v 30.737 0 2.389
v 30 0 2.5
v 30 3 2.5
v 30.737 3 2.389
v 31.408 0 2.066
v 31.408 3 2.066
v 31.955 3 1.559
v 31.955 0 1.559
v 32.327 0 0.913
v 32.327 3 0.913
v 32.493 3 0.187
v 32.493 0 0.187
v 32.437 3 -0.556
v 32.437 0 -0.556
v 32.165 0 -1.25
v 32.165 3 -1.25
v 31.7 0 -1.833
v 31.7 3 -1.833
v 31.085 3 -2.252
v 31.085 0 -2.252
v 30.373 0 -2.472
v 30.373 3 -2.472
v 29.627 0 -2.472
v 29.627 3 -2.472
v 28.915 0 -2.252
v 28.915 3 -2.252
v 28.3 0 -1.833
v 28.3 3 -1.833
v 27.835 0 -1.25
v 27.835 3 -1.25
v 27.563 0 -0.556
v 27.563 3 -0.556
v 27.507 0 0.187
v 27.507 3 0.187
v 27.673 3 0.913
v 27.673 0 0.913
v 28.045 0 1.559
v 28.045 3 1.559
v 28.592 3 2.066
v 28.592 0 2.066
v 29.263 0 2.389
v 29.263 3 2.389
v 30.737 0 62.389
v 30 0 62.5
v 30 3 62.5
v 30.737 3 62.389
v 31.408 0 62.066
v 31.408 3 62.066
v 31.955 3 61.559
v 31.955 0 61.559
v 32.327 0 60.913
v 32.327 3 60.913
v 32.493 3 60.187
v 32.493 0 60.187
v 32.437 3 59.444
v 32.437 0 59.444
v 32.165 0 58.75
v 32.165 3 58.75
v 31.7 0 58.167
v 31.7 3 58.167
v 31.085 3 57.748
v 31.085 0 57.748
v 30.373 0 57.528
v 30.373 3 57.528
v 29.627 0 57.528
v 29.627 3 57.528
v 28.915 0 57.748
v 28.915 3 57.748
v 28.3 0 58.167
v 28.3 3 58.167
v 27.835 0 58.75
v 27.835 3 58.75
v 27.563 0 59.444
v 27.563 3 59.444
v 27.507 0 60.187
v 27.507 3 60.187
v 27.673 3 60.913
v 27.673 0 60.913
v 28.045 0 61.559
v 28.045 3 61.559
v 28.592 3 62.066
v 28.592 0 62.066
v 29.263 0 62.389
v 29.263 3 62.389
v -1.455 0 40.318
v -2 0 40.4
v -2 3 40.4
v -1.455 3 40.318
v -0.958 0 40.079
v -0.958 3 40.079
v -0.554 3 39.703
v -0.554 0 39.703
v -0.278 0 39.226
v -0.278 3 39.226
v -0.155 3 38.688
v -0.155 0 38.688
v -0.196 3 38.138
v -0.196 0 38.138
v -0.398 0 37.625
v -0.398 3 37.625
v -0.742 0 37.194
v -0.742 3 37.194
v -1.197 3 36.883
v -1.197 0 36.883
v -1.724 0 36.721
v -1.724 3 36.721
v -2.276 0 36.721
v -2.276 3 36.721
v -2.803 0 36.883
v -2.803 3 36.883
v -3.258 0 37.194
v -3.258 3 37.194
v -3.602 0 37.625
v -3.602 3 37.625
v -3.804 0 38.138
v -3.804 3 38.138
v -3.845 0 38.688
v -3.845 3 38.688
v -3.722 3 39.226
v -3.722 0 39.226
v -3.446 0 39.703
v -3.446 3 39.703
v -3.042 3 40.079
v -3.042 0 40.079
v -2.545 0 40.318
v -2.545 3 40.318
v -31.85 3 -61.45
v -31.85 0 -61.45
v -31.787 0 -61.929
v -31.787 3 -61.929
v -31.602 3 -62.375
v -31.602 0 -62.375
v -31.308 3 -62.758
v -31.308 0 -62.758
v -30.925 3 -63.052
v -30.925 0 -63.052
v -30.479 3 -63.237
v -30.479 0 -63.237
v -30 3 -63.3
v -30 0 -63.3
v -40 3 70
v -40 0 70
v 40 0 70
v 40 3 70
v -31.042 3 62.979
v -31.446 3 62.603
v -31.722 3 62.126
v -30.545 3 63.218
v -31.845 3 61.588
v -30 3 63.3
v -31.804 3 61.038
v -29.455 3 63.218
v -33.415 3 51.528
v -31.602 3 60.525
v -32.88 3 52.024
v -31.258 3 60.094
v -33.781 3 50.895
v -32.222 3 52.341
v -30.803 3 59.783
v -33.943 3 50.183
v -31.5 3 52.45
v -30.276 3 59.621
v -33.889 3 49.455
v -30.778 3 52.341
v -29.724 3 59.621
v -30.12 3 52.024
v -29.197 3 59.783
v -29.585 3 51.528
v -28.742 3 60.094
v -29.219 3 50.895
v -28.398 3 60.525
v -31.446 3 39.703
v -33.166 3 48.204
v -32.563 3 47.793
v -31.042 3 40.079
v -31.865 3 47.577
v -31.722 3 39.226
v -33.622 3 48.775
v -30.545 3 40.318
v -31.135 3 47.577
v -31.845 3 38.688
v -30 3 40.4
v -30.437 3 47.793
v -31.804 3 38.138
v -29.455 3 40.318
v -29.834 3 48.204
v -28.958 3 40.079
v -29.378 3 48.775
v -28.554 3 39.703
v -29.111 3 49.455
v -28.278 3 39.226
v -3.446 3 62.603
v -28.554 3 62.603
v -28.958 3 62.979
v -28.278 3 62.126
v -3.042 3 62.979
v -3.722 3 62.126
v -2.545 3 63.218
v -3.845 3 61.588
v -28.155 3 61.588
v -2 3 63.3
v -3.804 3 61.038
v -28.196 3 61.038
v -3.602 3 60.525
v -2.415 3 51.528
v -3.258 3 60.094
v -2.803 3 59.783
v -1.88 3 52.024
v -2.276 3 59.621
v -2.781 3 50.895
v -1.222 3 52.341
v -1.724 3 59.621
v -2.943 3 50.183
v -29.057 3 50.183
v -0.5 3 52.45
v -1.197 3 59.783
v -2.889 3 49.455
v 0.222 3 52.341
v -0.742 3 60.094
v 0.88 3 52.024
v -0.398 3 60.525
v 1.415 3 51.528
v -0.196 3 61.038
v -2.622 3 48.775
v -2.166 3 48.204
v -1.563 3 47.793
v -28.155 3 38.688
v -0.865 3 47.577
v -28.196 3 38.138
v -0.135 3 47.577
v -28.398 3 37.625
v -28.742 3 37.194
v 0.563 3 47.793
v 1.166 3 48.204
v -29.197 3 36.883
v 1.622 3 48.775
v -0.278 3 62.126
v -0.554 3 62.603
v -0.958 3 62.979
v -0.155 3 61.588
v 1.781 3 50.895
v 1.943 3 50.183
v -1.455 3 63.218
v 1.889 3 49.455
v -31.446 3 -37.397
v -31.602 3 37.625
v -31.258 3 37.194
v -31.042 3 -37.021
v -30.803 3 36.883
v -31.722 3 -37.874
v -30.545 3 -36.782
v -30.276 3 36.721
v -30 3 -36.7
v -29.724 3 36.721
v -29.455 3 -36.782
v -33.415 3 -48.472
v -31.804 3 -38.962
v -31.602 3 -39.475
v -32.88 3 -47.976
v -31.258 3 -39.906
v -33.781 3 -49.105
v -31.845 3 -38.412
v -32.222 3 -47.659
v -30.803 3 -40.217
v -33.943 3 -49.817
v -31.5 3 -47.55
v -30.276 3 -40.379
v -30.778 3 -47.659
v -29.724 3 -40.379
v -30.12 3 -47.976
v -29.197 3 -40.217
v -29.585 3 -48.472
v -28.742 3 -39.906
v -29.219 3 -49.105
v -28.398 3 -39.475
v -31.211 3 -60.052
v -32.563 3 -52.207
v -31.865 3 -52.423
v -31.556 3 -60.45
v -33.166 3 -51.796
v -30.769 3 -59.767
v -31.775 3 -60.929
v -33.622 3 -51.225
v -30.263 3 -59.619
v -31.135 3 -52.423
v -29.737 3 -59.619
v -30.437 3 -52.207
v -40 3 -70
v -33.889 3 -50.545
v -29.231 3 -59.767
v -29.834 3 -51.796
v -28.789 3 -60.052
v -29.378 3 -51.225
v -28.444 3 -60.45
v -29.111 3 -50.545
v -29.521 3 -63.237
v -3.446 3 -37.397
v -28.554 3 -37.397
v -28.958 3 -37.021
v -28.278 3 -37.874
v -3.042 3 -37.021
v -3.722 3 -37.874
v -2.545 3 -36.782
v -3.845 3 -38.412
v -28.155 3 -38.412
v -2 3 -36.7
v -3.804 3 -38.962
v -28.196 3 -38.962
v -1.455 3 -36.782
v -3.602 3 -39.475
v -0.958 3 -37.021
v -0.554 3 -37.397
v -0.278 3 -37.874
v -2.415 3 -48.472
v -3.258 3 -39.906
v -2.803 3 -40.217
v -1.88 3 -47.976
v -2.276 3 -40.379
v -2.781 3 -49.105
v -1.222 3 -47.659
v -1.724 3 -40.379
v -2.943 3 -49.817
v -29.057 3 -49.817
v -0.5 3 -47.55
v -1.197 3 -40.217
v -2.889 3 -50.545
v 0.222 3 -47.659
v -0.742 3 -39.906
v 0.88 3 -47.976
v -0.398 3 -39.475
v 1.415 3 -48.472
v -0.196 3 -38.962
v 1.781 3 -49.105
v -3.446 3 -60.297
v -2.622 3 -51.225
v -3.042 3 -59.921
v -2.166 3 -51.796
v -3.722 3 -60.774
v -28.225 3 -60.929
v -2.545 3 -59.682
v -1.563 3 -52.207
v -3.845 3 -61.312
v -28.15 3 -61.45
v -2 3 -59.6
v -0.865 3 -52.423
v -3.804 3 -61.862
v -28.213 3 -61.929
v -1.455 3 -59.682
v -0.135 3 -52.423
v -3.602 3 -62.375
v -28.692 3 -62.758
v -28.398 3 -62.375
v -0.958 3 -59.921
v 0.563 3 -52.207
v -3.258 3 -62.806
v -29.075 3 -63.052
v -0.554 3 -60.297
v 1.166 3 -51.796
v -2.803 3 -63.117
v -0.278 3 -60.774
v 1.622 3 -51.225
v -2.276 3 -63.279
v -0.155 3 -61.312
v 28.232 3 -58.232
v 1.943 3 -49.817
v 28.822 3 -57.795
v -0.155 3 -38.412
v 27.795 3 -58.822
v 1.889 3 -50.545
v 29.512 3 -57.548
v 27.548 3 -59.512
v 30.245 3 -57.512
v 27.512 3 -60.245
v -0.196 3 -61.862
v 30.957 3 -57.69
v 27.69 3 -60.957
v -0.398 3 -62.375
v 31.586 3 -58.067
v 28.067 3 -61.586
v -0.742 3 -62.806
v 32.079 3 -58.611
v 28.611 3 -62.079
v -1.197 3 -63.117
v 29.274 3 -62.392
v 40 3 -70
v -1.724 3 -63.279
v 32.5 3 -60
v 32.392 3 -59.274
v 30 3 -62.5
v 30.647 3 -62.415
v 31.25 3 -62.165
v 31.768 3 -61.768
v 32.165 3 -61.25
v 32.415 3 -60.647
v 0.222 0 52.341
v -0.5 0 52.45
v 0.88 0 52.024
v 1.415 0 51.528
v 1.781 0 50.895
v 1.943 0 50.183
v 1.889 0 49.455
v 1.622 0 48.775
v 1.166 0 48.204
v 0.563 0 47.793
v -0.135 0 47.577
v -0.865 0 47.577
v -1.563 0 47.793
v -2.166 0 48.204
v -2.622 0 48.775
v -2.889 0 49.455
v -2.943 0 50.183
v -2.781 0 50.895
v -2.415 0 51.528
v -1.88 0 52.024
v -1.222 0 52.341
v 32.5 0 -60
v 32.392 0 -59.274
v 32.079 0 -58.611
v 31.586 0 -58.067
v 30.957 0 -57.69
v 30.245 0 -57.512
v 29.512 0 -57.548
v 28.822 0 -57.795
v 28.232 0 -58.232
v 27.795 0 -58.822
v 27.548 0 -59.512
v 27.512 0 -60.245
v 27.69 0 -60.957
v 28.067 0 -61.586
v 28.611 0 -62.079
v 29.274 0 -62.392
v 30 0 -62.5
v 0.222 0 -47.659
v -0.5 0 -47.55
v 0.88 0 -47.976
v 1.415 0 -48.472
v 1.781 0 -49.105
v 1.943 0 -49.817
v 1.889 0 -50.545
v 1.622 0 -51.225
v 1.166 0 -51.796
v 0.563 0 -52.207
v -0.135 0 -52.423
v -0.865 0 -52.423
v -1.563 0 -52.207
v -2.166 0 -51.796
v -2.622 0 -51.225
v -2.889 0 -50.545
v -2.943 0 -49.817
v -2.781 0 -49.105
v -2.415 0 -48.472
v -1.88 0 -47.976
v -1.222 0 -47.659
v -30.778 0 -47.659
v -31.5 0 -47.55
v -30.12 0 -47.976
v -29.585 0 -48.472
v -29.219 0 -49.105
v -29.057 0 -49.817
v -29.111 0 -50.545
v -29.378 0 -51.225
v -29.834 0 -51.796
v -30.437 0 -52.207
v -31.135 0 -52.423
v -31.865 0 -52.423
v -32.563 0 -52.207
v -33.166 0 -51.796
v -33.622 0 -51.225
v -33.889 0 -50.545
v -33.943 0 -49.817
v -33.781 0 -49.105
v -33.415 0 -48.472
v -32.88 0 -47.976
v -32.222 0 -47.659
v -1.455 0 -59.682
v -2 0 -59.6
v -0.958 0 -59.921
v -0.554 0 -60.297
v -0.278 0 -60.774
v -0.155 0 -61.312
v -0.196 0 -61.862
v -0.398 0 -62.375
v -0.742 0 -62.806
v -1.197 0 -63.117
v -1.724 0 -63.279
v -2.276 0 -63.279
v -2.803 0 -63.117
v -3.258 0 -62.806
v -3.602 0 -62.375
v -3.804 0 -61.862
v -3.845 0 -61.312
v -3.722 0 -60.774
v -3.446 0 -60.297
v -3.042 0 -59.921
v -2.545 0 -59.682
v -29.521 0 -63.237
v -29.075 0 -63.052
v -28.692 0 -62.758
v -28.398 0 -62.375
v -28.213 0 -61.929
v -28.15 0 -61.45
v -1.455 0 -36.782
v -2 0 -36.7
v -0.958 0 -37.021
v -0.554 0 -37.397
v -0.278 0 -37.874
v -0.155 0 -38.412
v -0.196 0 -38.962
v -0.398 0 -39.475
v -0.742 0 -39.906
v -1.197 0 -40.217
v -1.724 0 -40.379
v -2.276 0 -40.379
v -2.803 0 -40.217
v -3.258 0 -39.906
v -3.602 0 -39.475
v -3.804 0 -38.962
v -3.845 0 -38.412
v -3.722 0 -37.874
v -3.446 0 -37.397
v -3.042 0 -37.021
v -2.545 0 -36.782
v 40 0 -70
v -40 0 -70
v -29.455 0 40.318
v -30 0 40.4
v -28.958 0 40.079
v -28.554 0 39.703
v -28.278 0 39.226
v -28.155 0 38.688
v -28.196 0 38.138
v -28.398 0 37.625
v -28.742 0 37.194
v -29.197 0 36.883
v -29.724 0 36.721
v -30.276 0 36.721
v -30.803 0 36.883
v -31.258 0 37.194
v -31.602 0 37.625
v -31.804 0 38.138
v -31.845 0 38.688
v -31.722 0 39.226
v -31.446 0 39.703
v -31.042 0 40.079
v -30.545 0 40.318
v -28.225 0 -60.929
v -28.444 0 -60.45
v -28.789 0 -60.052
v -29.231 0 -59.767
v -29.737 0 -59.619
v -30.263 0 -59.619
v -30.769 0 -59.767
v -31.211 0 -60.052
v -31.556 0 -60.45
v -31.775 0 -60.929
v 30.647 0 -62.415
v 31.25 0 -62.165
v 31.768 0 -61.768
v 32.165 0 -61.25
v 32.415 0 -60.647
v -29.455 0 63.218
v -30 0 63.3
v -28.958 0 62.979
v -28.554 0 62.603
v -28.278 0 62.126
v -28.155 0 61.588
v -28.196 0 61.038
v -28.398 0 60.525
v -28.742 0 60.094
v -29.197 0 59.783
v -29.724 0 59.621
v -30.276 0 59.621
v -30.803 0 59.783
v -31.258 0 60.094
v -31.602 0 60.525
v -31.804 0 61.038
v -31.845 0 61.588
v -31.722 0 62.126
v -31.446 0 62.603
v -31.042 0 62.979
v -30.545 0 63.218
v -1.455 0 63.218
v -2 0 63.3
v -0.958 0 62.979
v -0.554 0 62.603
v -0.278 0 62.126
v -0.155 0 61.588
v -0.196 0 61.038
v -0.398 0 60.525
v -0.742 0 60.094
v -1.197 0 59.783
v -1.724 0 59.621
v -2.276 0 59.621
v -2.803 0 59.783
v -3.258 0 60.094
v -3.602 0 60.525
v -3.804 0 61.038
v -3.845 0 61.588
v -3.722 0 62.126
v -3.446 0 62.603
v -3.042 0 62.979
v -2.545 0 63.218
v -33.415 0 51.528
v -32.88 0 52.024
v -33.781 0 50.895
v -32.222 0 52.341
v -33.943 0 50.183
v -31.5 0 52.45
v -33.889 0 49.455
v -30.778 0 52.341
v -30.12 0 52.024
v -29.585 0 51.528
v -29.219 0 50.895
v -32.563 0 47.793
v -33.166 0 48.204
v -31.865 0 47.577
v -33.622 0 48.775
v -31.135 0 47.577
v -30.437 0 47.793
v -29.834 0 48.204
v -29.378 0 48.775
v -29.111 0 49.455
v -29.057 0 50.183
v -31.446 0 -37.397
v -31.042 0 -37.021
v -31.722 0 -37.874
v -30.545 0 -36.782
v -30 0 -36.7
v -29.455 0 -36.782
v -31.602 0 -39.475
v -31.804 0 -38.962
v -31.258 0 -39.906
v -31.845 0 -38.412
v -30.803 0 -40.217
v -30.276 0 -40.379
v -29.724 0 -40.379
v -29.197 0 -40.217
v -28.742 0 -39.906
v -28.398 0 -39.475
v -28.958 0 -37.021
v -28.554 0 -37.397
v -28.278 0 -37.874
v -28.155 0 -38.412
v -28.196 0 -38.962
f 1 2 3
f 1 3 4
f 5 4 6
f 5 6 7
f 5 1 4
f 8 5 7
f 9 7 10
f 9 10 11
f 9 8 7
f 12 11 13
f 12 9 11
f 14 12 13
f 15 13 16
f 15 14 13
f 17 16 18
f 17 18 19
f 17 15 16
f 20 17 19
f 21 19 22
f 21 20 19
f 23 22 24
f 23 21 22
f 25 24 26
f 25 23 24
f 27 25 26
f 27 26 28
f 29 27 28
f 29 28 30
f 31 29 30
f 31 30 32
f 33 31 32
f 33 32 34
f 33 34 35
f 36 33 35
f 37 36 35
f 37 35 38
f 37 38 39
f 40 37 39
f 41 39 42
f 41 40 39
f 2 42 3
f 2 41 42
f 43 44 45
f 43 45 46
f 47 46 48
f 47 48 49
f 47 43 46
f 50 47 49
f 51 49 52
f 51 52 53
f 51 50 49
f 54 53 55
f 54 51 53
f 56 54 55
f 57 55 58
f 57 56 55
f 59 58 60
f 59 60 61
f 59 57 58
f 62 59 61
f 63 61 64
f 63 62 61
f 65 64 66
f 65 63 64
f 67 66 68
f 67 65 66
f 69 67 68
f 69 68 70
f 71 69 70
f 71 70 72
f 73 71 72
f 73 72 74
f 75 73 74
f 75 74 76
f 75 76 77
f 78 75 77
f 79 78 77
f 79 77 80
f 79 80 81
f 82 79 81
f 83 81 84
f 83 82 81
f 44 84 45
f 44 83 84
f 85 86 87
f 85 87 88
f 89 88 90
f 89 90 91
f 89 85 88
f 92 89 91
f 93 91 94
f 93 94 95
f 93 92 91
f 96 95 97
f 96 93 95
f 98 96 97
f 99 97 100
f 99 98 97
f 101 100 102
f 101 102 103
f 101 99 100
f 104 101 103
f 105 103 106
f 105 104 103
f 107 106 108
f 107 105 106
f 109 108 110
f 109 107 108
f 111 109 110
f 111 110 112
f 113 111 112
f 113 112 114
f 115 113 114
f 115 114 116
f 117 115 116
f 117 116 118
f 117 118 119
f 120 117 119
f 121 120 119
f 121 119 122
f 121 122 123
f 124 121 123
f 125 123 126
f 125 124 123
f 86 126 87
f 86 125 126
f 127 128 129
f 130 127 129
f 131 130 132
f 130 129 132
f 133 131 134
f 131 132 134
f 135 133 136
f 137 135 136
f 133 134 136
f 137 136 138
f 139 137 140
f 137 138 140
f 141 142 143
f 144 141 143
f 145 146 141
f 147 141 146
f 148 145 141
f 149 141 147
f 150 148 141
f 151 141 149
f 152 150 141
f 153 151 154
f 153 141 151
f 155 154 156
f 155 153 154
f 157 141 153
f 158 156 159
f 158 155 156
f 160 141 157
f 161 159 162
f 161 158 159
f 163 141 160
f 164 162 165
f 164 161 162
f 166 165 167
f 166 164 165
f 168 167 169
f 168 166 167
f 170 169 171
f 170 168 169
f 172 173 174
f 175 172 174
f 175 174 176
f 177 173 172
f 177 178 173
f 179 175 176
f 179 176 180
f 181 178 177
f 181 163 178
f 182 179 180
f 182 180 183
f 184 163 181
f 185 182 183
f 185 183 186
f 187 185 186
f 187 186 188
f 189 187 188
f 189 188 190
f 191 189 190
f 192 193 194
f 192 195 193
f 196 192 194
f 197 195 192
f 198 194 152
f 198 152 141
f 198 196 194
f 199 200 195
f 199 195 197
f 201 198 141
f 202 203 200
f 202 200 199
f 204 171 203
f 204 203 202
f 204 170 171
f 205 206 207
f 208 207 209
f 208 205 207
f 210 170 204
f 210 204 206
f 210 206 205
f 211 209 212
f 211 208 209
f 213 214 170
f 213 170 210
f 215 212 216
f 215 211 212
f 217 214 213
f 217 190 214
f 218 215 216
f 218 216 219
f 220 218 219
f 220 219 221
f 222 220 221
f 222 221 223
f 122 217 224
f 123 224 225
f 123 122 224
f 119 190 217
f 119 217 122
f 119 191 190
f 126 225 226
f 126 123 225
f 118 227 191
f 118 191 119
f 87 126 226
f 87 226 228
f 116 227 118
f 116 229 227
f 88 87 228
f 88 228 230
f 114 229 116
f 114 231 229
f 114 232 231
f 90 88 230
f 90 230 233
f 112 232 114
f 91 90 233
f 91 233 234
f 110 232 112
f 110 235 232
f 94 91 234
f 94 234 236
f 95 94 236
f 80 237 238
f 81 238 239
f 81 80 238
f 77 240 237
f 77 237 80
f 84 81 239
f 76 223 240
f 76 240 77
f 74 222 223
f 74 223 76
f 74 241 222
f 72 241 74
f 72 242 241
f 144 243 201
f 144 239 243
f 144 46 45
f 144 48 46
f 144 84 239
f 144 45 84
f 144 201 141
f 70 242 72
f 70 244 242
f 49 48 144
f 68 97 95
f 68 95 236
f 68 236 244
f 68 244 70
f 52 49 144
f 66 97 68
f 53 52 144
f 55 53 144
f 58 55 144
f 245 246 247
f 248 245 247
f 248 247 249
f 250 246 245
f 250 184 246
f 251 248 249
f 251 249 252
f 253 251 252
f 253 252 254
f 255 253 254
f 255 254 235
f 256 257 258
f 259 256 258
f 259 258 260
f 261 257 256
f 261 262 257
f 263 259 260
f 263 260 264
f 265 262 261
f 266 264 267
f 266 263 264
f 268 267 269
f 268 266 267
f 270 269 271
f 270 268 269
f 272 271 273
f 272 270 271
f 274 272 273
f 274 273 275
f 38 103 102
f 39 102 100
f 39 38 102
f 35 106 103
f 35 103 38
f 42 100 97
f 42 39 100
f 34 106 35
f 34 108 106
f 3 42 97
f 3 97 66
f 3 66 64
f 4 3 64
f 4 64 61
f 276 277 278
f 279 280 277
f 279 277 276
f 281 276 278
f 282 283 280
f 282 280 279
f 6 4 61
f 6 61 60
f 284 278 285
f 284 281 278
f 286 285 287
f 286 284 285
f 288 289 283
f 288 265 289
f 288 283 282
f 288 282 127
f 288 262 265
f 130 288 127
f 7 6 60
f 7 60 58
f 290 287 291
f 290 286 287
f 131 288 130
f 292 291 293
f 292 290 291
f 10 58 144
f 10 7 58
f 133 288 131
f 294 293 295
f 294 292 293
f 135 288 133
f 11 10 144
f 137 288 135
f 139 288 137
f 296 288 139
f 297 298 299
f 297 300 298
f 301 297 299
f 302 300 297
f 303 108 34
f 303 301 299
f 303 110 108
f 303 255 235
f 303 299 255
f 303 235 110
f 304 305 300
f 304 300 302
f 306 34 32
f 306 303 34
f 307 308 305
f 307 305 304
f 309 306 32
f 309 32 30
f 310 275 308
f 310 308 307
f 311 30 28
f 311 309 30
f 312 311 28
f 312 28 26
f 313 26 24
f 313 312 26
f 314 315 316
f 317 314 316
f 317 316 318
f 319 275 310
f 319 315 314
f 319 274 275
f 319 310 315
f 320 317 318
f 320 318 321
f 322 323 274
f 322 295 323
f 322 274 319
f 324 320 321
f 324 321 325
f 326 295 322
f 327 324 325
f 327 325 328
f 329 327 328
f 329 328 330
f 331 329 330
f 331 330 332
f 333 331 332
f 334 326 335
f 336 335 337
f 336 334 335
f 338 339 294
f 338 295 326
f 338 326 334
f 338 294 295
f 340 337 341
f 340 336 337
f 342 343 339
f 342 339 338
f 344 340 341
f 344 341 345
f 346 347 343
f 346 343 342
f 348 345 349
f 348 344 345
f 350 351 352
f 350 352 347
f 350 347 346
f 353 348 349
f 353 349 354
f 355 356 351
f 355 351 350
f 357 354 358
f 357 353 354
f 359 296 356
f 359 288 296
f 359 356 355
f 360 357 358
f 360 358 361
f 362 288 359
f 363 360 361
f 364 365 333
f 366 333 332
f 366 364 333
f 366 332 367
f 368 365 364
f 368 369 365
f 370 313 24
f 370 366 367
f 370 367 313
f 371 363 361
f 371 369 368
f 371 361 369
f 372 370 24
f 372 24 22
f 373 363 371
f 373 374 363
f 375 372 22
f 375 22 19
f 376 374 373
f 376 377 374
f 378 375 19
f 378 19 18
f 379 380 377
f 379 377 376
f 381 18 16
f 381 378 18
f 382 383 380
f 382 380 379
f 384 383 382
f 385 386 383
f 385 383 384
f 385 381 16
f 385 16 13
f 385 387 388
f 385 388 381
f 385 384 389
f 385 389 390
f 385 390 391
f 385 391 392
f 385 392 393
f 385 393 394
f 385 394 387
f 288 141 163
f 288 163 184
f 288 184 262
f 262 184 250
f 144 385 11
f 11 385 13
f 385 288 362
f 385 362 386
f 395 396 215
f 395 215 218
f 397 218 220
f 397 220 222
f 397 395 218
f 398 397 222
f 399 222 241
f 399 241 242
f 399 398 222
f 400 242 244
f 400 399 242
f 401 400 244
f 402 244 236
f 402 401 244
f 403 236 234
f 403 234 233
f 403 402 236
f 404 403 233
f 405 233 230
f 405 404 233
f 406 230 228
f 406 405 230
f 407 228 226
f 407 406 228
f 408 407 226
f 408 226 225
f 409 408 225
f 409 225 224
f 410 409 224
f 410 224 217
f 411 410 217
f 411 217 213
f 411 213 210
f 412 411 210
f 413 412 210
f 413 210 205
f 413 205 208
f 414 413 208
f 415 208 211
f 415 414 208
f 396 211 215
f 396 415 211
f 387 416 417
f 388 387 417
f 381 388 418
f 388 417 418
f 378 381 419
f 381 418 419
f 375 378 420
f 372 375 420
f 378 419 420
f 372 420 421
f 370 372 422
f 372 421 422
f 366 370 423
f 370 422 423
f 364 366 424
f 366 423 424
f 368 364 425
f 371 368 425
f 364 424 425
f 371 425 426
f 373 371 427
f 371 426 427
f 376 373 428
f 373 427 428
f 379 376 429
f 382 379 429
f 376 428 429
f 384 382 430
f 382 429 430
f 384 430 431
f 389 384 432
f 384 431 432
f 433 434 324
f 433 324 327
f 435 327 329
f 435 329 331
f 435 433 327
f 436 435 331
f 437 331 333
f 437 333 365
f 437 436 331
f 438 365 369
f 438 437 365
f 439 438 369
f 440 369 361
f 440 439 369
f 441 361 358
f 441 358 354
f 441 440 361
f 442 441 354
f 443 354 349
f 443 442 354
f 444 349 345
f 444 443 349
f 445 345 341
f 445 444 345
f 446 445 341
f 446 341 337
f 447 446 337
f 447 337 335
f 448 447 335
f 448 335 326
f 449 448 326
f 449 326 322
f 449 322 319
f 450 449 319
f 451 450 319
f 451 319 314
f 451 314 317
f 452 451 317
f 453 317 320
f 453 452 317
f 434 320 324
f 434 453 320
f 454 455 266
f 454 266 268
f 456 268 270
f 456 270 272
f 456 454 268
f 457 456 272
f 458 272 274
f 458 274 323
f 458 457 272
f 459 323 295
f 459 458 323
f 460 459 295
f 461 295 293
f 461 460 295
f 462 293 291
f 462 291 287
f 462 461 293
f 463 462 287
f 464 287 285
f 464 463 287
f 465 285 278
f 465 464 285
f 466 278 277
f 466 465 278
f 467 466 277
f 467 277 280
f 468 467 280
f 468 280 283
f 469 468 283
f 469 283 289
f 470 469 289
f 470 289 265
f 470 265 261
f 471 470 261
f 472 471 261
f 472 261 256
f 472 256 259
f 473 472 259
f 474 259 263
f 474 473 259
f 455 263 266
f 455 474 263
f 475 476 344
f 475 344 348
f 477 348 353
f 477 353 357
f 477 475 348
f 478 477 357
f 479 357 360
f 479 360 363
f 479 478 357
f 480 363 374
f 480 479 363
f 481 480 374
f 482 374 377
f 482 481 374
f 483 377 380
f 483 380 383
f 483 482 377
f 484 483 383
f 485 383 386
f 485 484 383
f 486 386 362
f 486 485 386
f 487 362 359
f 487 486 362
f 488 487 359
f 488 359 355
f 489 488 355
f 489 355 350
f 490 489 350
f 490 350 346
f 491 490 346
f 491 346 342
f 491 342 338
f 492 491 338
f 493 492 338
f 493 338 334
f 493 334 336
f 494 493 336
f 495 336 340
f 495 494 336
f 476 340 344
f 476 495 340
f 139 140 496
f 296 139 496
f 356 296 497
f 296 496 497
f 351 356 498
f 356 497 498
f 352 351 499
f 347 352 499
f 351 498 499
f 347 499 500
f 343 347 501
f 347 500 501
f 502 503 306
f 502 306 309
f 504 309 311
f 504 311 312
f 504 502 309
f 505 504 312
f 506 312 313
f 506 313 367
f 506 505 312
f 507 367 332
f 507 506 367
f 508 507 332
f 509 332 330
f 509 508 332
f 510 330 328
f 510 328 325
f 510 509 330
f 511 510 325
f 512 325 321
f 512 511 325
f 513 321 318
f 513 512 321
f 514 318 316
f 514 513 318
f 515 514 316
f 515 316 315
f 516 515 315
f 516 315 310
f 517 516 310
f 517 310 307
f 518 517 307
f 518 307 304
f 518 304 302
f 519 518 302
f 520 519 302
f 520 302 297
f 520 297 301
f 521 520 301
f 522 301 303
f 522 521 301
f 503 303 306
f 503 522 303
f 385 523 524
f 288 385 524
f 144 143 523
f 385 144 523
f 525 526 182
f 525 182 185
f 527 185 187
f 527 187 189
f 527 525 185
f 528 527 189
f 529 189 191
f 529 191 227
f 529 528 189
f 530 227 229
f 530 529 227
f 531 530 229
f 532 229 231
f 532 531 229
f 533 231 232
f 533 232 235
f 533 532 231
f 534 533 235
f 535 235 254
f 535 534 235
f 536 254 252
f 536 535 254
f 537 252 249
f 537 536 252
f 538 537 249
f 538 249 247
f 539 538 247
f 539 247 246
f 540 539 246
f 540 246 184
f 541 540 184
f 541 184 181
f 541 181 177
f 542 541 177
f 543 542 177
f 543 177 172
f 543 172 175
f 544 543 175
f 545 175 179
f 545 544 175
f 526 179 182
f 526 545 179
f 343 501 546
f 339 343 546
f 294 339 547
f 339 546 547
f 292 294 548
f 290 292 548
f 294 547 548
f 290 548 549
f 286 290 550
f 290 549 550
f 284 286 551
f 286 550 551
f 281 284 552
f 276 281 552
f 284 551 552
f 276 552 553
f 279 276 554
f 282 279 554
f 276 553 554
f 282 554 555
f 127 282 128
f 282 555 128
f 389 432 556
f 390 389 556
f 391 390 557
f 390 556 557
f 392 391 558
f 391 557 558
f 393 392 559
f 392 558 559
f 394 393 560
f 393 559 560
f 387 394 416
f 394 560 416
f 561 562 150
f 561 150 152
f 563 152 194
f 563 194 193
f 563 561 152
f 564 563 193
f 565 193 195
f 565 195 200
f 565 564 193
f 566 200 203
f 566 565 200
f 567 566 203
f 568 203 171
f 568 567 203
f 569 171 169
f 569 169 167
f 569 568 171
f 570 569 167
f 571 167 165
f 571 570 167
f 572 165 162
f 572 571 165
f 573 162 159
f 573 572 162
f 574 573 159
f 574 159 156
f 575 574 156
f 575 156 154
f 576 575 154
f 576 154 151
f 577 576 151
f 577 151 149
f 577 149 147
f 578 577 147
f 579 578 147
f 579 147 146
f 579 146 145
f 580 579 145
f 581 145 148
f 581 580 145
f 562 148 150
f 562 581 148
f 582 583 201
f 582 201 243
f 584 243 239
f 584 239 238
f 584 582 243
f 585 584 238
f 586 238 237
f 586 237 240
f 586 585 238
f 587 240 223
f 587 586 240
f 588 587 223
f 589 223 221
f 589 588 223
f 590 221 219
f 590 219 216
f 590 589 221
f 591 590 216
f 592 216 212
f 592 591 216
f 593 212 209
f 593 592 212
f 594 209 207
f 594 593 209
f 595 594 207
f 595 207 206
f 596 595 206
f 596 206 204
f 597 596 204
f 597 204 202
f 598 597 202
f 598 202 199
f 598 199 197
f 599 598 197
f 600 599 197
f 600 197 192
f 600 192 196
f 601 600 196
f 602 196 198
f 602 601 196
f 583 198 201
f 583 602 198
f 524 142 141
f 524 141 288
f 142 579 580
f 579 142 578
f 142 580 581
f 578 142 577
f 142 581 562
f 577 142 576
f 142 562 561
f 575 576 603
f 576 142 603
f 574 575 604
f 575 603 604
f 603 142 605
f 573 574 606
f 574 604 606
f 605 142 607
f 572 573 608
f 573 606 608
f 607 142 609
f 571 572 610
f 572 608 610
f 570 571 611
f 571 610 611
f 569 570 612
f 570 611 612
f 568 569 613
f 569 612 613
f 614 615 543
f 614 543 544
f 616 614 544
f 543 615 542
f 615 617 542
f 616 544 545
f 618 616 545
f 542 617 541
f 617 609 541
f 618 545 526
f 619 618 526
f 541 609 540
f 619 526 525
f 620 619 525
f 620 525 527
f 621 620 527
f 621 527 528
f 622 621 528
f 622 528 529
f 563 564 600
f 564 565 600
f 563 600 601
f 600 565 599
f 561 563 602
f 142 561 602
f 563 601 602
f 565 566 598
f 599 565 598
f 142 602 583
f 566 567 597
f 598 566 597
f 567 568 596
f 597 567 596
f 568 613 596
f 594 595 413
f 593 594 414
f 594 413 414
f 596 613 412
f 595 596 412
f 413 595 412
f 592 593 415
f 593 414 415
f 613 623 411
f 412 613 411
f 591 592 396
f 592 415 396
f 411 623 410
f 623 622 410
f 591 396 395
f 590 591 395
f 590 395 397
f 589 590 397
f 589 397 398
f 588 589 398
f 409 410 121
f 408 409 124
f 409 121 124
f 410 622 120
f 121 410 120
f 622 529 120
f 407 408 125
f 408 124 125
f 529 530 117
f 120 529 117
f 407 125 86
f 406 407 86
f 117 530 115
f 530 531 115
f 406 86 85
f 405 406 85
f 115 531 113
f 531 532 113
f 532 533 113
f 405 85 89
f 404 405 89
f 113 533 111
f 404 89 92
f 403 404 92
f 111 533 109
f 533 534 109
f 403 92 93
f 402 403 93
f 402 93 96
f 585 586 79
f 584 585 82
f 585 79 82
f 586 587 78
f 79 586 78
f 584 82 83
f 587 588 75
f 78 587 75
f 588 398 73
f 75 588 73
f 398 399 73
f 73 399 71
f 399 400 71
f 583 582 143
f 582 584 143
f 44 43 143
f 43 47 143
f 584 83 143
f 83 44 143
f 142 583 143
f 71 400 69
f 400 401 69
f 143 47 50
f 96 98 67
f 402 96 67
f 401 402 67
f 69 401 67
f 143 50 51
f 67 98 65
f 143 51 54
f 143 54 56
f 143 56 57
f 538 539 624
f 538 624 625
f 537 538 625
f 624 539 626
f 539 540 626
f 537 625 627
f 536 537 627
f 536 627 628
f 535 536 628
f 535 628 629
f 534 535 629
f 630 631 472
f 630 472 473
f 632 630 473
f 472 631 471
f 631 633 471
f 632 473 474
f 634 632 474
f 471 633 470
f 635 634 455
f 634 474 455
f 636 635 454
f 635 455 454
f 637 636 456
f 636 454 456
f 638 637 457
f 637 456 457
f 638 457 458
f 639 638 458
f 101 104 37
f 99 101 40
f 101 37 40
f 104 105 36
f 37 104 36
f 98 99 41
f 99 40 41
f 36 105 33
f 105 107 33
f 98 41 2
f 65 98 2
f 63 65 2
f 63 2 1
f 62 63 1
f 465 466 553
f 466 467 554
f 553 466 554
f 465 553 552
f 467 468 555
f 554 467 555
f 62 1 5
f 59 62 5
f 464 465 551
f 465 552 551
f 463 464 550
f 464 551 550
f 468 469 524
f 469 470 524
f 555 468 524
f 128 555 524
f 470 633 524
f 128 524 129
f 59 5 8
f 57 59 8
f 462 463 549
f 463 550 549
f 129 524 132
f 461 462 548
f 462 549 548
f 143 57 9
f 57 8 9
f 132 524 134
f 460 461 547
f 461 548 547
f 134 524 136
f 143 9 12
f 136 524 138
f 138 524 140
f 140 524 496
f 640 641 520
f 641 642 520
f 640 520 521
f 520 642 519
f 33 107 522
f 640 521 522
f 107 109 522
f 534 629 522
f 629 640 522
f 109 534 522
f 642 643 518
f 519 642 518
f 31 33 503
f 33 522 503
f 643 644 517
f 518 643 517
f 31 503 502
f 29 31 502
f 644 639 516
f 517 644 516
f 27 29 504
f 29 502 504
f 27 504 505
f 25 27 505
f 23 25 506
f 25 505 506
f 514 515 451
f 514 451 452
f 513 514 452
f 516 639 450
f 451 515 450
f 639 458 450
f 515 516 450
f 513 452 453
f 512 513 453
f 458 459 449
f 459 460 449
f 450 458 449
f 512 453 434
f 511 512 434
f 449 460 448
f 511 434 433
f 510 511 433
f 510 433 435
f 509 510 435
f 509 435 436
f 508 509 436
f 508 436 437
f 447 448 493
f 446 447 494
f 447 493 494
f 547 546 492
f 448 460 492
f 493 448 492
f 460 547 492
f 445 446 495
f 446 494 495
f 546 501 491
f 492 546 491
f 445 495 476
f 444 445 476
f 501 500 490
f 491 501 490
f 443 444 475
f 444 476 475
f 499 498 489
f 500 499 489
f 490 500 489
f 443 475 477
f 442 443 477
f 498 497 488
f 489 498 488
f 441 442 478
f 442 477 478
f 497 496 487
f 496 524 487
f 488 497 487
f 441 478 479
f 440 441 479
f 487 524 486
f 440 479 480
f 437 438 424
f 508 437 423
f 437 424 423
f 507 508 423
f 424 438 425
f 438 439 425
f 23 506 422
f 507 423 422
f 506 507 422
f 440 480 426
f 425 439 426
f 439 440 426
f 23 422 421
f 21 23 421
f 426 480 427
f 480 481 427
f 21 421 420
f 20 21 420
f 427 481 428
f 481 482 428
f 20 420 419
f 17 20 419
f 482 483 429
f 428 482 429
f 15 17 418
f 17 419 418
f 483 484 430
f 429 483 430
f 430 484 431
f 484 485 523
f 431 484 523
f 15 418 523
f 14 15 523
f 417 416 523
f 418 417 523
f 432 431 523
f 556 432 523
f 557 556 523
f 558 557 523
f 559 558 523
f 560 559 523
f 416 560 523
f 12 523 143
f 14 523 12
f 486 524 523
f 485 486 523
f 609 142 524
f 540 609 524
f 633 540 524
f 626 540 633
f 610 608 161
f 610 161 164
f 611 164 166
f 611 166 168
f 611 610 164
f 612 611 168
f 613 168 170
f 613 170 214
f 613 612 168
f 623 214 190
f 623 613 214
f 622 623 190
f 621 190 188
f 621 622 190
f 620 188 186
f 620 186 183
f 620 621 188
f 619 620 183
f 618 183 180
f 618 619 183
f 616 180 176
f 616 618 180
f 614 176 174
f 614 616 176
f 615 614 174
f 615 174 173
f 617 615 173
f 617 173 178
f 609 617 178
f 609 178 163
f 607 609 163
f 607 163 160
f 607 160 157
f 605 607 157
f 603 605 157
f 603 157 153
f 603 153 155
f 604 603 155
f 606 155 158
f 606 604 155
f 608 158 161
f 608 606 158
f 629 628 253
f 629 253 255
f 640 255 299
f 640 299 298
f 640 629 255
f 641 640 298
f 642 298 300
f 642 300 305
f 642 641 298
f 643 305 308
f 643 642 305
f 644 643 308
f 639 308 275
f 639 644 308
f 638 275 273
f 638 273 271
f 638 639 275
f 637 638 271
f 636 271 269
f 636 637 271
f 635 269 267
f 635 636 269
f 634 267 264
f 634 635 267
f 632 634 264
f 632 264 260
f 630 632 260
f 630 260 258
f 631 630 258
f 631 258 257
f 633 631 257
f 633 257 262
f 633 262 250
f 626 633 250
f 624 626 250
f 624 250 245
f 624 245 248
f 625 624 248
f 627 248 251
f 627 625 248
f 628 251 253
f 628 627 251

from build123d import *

# Parameters (mm, degrees)
SKETCH_1_R      = 2.5
SKETCH_1_R_2    = 2.45
SKETCH_1_R_3    = 1.85
SKETCH_1_W      = 48
SKETCH_1_H      = 40
EXTRUDE_1_DEPTH = 3


with BuildPart() as part:
    # 草图1 → 凸台-拉伸1 (new body)
    # profile 1 of 5: a face of its own
    with BuildSketch(Plane(origin=(0, 0, 0), x_dir=(1, 0, 0), z_dir=(0, 1, 0))):
        with BuildLine():
            Line((8, -30), (8, -70))
            Line((8, -70), (40, -70))
            Line((40, -70), (40, 60))
            Line((40, 60), (32.5, 60))
            ThreePointArc((32.5, 60), (28.232233047, 58.232233047), (30, 62.5))
            Line((30, 62.5), (30, 70))
            Line((30, 70), (8, 70))
            Line((8, 70), (8, 30))
            Line((8, 30), (-40, 30))
            Line((-40, 30), (-40, -30))
            Line((-40, -30), (8, -30))
        make_face()
        with Locations(Location((30, -60, 0), (0, 0, 270))):
            Circle(SKETCH_1_R, mode=Mode.SUBTRACT)
        with Locations(Location((30, 0, 0), (0, 0, 270))):
            Circle(SKETCH_1_R, mode=Mode.SUBTRACT)
    # profile 2 of 5: a face of its own
    with BuildSketch(Plane(origin=(0, 0, 0), x_dir=(1, 0, 0), z_dir=(0, 1, 0))):
        with BuildLine():
            Line((32.5, 60), (40, 60))
            Line((40, 60), (40, 70))
            Line((40, 70), (30, 70))
            Line((30, 70), (30, 62.5))
            ThreePointArc((30, 62.5), (31.767766953, 61.767766953), (32.5, 60))
        make_face()
    # profile 3 of 5: a face of its own
    with BuildSketch(Plane(origin=(0, 0, 0), x_dir=(1, 0, 0), z_dir=(0, 1, 0))):
        with BuildLine():
            Line((-40, 61.45), (-40, 30))
            Line((-40, 30), (8, 30))
            Line((8, 30), (8, 70))
            Line((8, 70), (-30, 70))
            Line((-30, 70), (-30, 63.3))
            ThreePointArc((-30, 63.3), (-28.691852455, 62.758147545), (-28.15, 61.45))
            ThreePointArc((-28.15, 61.45), (-30, 59.6), (-31.85, 61.45))
            Line((-31.85, 61.45), (-40, 61.45))
        make_face()
        with Locations(Location((-31.5, 50, 0), (0, 0, 270))):
            Circle(SKETCH_1_R_2, mode=Mode.SUBTRACT)
        with Locations(Location((-30, 38.55, 0), (0, 0, 270))):
            Circle(SKETCH_1_R_3, mode=Mode.SUBTRACT)
        with Locations(Location((-2, 38.55, 0), (0, 0, 270))):
            Circle(SKETCH_1_R_3, mode=Mode.SUBTRACT)
        with Locations(Location((-0.5, 50, 0), (0, 0, 270))):
            Circle(SKETCH_1_R_2, mode=Mode.SUBTRACT)
        with Locations(Location((-2, 61.45, 0), (0, 0, 270))):
            Circle(SKETCH_1_R_3, mode=Mode.SUBTRACT)
    # profile 4 of 5: a face of its own
    with BuildSketch(Plane(origin=(0, 0, 0), x_dir=(1, 0, 0), z_dir=(0, 1, 0))):
        with BuildLine():
            Line((-40, 70), (-40, 61.45))
            Line((-40, 61.45), (-31.85, 61.45))
            ThreePointArc((-31.85, 61.45), (-31.308147545, 62.758147545), (-30, 63.3))
            Line((-30, 63.3), (-30, 70))
            Line((-30, 70), (-40, 70))
        make_face()
    # profile 5 of 5: a face of its own
    with BuildSketch(Plane(origin=(0, 0, 0), x_dir=(1, 0, 0), z_dir=(0, 1, 0))):
        with Locations((-16, -50)):
            Rectangle(SKETCH_1_W, SKETCH_1_H)
        with Locations(Location((-30, -61.45, 0), (0, 0, 270))):
            Circle(SKETCH_1_R_3, mode=Mode.SUBTRACT)
        with Locations(Location((-31.5, -50, 0), (0, 0, 270))):
            Circle(SKETCH_1_R_2, mode=Mode.SUBTRACT)
        with Locations(Location((-30, -38.55, 0), (0, 0, 270))):
            Circle(SKETCH_1_R_3, mode=Mode.SUBTRACT)
        with Locations(Location((-2, -61.45, 0), (0, 0, 270))):
            Circle(SKETCH_1_R_3, mode=Mode.SUBTRACT)
        with Locations(Location((-0.5, -50, 0), (0, 0, 270))):
            Circle(SKETCH_1_R_2, mode=Mode.SUBTRACT)
        with Locations(Location((-2, -38.55, 0), (0, 0, 270))):
            Circle(SKETCH_1_R_3, mode=Mode.SUBTRACT)
    extrude(amount=EXTRUDE_1_DEPTH)


solid = part.part
